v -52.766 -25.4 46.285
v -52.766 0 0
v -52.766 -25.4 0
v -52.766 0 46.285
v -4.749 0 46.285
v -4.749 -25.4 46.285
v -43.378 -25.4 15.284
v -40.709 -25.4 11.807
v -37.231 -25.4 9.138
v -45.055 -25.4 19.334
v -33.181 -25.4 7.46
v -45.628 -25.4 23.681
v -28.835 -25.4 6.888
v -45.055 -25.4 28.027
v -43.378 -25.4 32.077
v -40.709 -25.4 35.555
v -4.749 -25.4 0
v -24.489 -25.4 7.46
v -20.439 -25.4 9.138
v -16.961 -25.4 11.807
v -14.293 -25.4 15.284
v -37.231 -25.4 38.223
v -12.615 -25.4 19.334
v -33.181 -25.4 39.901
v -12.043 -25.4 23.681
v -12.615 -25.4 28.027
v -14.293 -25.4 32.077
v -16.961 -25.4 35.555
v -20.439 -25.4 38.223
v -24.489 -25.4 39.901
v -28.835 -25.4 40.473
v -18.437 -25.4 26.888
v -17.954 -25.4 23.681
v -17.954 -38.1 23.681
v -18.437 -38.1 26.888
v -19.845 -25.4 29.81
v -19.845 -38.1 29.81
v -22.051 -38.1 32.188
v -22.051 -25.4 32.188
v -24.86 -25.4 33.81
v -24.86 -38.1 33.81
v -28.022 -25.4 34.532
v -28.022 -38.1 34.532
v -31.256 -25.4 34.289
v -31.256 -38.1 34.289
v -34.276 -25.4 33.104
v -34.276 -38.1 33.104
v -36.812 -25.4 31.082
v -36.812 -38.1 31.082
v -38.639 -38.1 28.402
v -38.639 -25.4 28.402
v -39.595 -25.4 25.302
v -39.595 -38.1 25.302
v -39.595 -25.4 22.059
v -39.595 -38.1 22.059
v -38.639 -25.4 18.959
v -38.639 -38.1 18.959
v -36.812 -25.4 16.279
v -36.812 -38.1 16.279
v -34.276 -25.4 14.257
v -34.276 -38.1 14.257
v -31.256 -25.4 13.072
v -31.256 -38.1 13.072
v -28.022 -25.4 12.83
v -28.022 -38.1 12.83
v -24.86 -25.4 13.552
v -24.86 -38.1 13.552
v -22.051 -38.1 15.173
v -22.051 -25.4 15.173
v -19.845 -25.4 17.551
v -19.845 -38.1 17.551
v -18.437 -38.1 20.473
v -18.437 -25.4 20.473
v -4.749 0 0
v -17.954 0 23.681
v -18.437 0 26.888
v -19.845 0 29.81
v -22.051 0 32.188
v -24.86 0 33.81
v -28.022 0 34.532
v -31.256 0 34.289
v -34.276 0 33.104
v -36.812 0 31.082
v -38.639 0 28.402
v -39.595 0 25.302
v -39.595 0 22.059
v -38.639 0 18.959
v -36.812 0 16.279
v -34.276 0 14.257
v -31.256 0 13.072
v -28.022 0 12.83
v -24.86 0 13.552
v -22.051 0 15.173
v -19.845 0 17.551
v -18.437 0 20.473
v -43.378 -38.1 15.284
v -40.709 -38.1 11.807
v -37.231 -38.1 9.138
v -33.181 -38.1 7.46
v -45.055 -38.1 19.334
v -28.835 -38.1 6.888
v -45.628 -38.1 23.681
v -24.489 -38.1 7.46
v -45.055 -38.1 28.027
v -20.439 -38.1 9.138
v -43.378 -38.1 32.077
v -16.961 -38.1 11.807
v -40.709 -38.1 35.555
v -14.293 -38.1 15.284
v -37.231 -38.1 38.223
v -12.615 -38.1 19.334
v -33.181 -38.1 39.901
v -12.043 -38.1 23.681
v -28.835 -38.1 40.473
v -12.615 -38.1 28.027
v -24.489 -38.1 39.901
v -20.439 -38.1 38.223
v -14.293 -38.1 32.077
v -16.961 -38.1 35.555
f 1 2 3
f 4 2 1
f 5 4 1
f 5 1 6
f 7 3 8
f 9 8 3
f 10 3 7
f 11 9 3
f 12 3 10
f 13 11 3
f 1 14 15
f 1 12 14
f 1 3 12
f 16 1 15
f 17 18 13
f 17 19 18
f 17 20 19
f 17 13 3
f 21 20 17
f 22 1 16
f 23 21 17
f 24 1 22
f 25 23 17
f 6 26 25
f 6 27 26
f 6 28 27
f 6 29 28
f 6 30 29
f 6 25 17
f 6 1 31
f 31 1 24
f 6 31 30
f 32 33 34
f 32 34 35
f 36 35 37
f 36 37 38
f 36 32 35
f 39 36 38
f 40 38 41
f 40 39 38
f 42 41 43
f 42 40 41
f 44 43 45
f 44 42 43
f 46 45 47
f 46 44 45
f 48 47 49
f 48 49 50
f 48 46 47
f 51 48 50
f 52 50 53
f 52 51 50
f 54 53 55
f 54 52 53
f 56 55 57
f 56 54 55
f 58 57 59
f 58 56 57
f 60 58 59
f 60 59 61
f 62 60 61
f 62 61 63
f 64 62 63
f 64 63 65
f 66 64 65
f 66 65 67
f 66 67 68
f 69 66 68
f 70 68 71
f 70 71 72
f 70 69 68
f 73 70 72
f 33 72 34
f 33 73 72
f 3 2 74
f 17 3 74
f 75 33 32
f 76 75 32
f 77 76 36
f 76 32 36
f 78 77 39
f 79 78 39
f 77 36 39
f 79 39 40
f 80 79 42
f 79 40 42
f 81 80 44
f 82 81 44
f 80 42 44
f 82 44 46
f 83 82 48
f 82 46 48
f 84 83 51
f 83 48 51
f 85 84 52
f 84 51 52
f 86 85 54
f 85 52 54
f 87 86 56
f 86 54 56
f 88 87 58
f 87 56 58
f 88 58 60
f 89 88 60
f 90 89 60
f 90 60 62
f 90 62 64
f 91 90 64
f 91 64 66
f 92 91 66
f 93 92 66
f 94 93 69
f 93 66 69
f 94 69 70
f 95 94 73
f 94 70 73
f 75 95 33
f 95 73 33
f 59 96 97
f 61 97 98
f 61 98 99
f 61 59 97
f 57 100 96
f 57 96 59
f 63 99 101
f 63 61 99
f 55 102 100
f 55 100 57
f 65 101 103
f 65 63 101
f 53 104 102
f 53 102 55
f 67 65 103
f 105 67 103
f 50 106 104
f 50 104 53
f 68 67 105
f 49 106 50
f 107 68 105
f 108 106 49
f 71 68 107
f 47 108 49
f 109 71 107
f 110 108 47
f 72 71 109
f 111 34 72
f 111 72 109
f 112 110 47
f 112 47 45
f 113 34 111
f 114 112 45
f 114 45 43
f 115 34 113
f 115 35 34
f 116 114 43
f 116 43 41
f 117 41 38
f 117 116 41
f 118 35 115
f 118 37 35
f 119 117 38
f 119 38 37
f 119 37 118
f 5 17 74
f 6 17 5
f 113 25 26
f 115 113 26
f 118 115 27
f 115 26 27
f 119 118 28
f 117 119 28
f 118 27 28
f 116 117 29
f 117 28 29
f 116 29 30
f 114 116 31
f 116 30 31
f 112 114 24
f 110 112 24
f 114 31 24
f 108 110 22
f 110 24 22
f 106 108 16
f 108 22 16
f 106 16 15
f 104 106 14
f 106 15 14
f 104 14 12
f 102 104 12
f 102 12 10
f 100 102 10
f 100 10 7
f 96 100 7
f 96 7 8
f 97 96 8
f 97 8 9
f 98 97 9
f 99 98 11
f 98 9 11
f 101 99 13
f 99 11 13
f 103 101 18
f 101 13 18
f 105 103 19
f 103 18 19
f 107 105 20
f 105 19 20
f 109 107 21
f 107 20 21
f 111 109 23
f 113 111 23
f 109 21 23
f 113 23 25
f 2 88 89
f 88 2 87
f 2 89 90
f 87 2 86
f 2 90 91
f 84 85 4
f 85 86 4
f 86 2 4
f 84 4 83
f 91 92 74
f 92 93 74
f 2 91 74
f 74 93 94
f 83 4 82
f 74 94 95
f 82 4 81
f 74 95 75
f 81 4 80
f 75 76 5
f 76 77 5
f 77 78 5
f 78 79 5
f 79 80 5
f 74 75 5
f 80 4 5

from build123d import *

# Parameters (mm, degrees)
F0_W      = 52.766081
F0_H      = 46.285272
F1_DEPTH  = 25.4
F2_R      = 16.792402
F2_R_2    = 10.881349
F3_DEPTH  = 12.7
F3_FACE_R = 10.881349
F4_DEPTH  = 25.4
F5_W      = 4.748795
F5_H      = 46.285272
F6_DEPTH  = 25.4


with BuildPart() as f1:
    # F0 (on Front) → F1 (new body)
    with BuildSketch(Plane.XZ):
        with Locations((-26.38304, 23.142636)):
            Rectangle(F0_W, F0_H)
    extrude(amount=F1_DEPTH)

    # F2 (on face) → F3 (join)
    with BuildSketch(Plane.XZ.offset(25.4)):
        with Locations((-28.835148, 23.680672)):
            Circle(F2_R)
        with Locations((-28.835148, 23.680672)):
            Circle(F2_R_2, mode=Mode.SUBTRACT)
    extrude(amount=F3_DEPTH)

    # F3_face (on face) → F4 (cut)
    with BuildSketch(Plane(origin=(-28.835148, -25.4, 23.680672), x_dir=(1, 0, 0), z_dir=(0, -1, 0))):
        Circle(F3_FACE_R)
    extrude(amount=-F4_DEPTH, mode=Mode.SUBTRACT)

    # F5 (on face) → F6 (cut)
    with BuildSketch(Plane.XZ.offset(25.4)):
        with Locations((-2.374397, 23.142636)):
            Rectangle(F5_W, F5_H)
    extrude(amount=-F6_DEPTH, mode=Mode.SUBTRACT)


solid = f1.part
